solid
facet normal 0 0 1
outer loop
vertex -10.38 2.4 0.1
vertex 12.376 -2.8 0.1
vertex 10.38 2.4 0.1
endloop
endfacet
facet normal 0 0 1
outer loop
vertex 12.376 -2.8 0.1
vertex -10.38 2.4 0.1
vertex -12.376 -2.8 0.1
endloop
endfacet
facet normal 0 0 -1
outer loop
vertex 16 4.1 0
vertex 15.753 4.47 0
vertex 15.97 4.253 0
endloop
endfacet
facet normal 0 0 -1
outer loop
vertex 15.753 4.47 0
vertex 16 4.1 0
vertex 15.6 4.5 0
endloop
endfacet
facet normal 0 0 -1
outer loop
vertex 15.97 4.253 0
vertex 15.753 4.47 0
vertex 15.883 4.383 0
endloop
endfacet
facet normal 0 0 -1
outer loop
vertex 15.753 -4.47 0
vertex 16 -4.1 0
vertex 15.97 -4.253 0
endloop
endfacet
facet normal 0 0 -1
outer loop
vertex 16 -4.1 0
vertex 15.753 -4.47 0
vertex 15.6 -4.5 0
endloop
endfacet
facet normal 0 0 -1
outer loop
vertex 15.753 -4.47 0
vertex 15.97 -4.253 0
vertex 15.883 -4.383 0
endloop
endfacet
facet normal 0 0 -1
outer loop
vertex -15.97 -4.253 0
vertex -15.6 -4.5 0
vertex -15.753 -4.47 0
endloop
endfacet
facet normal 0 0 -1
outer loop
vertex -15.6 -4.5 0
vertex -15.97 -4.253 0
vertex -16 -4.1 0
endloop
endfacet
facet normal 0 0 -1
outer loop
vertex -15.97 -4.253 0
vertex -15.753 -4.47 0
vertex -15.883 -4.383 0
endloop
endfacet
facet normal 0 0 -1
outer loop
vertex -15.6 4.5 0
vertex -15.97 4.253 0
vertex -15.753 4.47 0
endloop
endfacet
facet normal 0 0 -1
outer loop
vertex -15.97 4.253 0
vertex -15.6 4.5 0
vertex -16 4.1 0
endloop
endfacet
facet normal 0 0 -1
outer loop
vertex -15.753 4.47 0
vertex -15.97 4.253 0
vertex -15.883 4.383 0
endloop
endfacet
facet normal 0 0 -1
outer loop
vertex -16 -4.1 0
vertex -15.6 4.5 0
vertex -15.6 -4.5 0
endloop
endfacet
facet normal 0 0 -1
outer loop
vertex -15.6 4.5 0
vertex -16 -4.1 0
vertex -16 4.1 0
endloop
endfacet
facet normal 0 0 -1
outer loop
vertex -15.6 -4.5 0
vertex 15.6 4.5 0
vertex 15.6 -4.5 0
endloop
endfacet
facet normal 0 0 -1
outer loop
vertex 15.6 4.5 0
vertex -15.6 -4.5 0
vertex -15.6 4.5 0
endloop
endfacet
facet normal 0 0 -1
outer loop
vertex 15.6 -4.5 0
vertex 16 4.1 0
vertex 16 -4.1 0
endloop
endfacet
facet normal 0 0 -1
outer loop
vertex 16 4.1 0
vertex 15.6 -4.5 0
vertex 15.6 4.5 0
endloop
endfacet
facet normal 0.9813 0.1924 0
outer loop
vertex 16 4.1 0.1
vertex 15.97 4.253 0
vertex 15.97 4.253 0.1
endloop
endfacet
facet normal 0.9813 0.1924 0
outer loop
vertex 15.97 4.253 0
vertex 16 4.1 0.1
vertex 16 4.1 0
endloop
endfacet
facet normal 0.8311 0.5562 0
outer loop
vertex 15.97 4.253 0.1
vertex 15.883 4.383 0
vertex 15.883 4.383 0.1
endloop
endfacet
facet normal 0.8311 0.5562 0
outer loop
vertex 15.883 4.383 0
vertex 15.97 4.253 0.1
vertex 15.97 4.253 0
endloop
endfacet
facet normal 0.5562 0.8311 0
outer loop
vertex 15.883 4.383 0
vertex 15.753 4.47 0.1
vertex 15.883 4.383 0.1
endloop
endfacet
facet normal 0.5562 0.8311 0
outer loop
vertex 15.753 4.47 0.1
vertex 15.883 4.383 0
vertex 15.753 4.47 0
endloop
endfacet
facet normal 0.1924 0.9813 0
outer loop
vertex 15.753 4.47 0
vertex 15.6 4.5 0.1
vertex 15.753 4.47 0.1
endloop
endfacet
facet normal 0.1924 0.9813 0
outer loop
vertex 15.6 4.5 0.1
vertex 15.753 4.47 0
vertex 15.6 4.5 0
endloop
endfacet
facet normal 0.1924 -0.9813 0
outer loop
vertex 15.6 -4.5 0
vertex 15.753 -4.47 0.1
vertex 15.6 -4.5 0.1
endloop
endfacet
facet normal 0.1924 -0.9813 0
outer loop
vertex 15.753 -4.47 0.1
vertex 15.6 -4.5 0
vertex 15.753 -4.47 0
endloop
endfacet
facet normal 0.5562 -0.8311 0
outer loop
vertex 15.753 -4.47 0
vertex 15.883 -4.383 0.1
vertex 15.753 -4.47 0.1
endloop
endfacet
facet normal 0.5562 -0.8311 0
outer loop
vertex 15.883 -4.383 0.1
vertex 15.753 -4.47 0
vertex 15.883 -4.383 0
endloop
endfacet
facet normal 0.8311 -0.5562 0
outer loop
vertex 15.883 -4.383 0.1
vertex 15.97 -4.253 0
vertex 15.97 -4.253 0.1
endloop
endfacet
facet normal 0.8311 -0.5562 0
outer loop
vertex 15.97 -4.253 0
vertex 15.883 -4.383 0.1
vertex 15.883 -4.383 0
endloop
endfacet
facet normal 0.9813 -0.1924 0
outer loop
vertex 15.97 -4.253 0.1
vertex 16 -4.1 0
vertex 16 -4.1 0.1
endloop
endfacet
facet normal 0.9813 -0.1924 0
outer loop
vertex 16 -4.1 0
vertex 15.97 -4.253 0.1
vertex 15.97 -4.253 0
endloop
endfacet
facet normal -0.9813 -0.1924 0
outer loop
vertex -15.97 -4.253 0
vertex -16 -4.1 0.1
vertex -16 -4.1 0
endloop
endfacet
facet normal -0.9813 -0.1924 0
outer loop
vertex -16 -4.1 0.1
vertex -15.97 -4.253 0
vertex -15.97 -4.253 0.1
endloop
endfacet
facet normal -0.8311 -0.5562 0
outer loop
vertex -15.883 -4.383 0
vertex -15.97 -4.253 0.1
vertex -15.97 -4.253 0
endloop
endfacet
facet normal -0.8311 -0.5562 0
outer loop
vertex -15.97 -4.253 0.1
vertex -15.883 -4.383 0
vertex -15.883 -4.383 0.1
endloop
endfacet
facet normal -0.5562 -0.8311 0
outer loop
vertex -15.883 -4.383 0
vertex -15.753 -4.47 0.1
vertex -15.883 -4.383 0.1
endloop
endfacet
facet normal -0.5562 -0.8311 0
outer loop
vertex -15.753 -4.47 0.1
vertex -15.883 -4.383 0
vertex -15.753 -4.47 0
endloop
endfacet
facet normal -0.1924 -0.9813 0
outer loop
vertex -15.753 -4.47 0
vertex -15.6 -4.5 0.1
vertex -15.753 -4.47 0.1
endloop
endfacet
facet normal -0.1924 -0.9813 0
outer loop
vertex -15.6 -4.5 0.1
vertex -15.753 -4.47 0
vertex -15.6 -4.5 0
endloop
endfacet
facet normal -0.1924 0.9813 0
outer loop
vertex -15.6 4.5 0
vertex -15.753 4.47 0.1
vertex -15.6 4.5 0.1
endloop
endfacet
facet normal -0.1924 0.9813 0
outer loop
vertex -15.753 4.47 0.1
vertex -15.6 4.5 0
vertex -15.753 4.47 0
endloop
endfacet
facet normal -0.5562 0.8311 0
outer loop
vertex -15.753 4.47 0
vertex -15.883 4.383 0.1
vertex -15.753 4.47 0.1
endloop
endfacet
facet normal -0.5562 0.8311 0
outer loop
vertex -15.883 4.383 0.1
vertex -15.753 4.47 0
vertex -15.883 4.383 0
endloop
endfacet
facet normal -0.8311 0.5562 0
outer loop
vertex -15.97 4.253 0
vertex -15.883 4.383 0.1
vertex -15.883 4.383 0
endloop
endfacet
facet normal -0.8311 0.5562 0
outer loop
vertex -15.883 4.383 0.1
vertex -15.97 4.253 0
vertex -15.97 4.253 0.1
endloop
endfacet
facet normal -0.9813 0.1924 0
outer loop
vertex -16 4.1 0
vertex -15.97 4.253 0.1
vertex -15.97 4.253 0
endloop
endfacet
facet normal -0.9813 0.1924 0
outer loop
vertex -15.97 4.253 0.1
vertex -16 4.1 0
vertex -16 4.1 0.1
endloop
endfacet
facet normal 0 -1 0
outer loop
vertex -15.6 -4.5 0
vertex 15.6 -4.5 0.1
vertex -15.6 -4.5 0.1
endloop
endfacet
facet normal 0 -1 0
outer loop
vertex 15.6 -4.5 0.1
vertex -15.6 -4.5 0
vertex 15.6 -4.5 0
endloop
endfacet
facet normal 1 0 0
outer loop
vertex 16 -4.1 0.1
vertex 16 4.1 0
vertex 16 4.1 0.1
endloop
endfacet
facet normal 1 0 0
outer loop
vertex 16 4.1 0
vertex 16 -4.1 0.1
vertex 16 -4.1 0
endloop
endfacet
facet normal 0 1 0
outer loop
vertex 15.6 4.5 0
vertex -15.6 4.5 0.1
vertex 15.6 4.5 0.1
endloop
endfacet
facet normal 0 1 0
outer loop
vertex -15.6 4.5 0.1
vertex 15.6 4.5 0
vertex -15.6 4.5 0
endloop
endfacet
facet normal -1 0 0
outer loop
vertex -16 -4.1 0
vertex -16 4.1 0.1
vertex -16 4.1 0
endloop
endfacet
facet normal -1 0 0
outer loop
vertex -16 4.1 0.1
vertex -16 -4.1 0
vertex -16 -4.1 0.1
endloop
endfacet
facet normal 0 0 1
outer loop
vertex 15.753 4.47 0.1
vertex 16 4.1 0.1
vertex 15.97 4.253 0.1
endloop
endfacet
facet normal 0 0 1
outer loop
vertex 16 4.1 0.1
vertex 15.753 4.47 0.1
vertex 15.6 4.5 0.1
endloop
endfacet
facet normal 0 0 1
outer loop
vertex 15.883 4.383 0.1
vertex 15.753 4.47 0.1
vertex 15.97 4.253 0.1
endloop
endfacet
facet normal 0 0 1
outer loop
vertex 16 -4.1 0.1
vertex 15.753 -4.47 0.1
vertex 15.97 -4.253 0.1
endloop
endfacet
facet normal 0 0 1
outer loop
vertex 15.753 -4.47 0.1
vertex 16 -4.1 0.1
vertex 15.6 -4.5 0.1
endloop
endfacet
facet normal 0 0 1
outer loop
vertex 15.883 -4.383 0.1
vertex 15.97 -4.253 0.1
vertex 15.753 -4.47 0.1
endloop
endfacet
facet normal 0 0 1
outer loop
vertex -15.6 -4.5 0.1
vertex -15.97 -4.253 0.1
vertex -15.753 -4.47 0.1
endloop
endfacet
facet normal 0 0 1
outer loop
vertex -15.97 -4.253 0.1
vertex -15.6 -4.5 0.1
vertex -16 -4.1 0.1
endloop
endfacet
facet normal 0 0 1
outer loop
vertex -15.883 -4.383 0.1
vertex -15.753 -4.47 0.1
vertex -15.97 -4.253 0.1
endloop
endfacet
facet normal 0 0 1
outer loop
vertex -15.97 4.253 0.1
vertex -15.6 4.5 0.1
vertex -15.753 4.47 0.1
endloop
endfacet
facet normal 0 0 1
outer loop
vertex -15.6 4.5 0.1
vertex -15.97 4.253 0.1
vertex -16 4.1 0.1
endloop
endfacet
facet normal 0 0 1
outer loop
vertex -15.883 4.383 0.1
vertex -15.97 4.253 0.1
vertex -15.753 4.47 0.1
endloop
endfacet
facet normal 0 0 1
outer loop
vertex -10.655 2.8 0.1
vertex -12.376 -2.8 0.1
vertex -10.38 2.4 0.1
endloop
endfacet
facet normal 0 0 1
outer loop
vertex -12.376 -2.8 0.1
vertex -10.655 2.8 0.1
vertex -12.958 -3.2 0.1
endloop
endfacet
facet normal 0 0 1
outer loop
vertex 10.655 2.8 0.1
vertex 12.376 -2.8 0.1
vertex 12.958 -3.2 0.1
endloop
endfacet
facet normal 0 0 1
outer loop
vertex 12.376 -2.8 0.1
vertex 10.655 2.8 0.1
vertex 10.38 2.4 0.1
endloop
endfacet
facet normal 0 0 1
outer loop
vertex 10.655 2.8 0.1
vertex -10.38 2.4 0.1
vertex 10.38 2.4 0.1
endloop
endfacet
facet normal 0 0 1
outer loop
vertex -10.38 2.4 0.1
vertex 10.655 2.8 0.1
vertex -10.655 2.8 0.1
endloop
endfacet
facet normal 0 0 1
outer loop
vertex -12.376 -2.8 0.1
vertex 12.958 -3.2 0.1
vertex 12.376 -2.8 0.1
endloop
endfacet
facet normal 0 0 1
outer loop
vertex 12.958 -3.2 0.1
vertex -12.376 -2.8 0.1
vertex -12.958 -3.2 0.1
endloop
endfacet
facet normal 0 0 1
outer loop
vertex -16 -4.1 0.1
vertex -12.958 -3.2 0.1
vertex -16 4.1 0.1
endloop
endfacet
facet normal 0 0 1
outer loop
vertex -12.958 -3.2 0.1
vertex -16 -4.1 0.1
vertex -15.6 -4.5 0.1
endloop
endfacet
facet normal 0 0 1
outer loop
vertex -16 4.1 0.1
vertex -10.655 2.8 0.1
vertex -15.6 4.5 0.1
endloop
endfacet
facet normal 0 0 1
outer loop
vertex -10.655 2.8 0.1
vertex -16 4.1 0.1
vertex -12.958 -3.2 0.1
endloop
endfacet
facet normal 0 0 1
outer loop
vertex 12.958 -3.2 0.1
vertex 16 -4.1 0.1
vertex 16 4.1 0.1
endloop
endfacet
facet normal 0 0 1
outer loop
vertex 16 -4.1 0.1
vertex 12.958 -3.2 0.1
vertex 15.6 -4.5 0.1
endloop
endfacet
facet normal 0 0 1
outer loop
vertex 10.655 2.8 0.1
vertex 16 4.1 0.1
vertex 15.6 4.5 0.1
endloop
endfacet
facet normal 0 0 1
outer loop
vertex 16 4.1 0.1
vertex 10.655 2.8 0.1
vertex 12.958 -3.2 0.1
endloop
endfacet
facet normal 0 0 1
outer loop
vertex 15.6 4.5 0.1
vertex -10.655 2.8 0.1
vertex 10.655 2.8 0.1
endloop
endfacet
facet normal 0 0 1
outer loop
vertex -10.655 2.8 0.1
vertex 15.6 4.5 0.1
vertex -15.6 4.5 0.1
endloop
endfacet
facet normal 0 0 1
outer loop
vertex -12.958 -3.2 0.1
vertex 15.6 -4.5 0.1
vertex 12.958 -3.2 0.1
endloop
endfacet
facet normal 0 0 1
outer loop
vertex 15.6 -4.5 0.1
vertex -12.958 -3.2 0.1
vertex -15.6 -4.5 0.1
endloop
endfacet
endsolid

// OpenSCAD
// file: ../p/1-4cyli.scad
use <../lib.scad>
function ldraw_lib__1_4cyli() = [
// 0 Cylinder 0.25
// 0 Name: 1-4cyli.dat
// 0 Author: James Jessiman
// 0 !LDRAW_ORG Primitive UPDATE 2012-01
// 0 !LICENSE Licensed under CC BY 2.0 and CC BY 4.0 : see CAreadme.txt
// 
// 0 BFC CERTIFY CCW
  [0,"BFC","CERTIFY"],
  [0,"BFC","CCW"],
// 
// 0 !HISTORY 2002-03-23 [sbliss] Added BFC statement.
// 0 !HISTORY 2002-04-25 [PTadmin] Official Update 2002-02
// 0 !HISTORY 2007-06-22 [PTadmin] Header formatted for Contributor Agreement
// 0 !HISTORY 2008-07-01 [PTadmin] Official Update 2008-01
// 0 !HISTORY 2012-02-16 [Philo] Changed to CCW
// 0 !HISTORY 2012-03-30 [PTadmin] Official Update 2012-01
// 
// 
// 4 16 1 1 0 0.9239 1 0.3827 0.9239 0 0.3827 1 0 0
  [4,16,1,1,0,0.9239,1,0.3827,0.9239,0,0.3827,1,0,0],
// 5 24 1 0 0 1 1 0 0.9239 0 0.3827 1 0 -1
  [5,24,1,0,0,1,1,0,0.9239,0,0.3827,1,0,-1],
// 4 16 0.9239 1 0.3827 0.7071 1 0.7071 0.7071 0 0.7071 0.9239 0 0.3827
  [4,16,0.9239,1,0.3827,0.7071,1,0.7071,0.7071,0,0.7071,0.9239,0,0.3827],
// 5 24 0.9239 0 0.3827 0.9239 1 0.3827 0.7071 0 0.7071 1 0 0
  [5,24,0.9239,0,0.3827,0.9239,1,0.3827,0.7071,0,0.7071,1,0,0],
// 4 16 0.7071 1 0.7071 0.3827 1 0.9239 0.3827 0 0.9239 0.7071 0 0.7071
  [4,16,0.7071,1,0.7071,0.3827,1,0.9239,0.3827,0,0.9239,0.7071,0,0.7071],
// 5 24 0.7071 0 0.7071 0.7071 1 0.7071 0.3827 0 0.9239 0.9239 0 0.3827
  [5,24,0.7071,0,0.7071,0.7071,1,0.7071,0.3827,0,0.9239,0.9239,0,0.3827],
// 4 16 0.3827 1 0.9239 0 1 1 0 0 1 0.3827 0 0.9239
  [4,16,0.3827,1,0.9239,0,1,1,0,0,1,0.3827,0,0.9239],
// 5 24 0.3827 0 0.9239 0.3827 1 0.9239 0 0 1 0.7071 0 0.7071
  [5,24,0.3827,0,0.9239,0.3827,1,0.9239,0,0,1,0.7071,0,0.7071],
// 5 24 0 0 1 0 1 1 0.3827 0 0.9239 -1 0 1
  [5,24,0,0,1,0,1,1,0.3827,0,0.9239,-1,0,1],
];
makepoly(ldraw_lib__1_4cyli(), line=0.2);
// file: ../p/1-4chrd.scad
use <../lib.scad>
function ldraw_lib__1_4chrd() = [
// 0 Chord 0.25
// 0 Name: 1-4chrd.dat
// 0 Author: Tony Hafner [hafhead]
// 0 !LDRAW_ORG Primitive UPDATE 2012-02
// 0 !LICENSE Licensed under CC BY 2.0 and CC BY 4.0 : see CAreadme.txt
// 
// 0 BFC CERTIFY CCW
  [0,"BFC","CERTIFY"],
  [0,"BFC","CCW"],
// 
// 0 !HISTORY 2004-04-22 [PTadmin] Official Update 2004-02
// 0 !HISTORY 2007-10-09 [PTadmin] Header formatted for Contributor Agreement
// 0 !HISTORY 2008-07-01 [PTadmin] Official Update 2008-01
// 0 !HISTORY 2012-08-02 [MMR1988] Re-creation with PrimGen2 and Rectifier
// 0 !HISTORY 2012-08-09 [PTadmin] Official Update 2012-02
// 
// 
// 4 16 0.9239 0 0.3827 0.3827 0 0.9239 0 0 1 1 0 0
  [4,16,0.9239,0,0.3827,0.3827,0,0.9239,0,0,1,1,0,0],
// 3 16 0.7071 0 0.7071 0.3827 0 0.9239 0.9239 0 0.3827
  [3,16,0.7071,0,0.7071,0.3827,0,0.9239,0.9239,0,0.3827],
];
makepoly(ldraw_lib__1_4chrd(), line=0.2);
// main file
use <../lib.scad>
use <../p/1-4chrd.scad>
use <../p/1-4cyli.scad>
function ldraw_lib__6045898d() = [
// 0 Sticker  1.1 x  4.0 with SW X-wing Starfighter Cockpit - Rear
// 0 Name: 6045898d.dat
// 0 Author: Evert-Jan Boer [ejboer]
// 0 !LDRAW_ORG Part UPDATE 2022-05
// 0 !LICENSE Licensed under CC BY 2.0 and CC BY 4.0 : see CAreadme.txt
// 
// 0 BFC CERTIFY CCW
  [0,"BFC","CERTIFY"],
  [0,"BFC","CCW"],
// 
// 0 !KEYWORDS Set 10240, Star Wars
// 
// 0 !HISTORY 2022-09-15 [PTadmin] Official Update 2022-05
// 
// 
// 4 16 -30.9402 -.25 -7 30.9402 -.25 -7 25.95 -.25 6 -25.95 -.25 6
  [4,16,-30.9402,-.25,-7,30.9402,-.25,-7,25.95,-.25,6,-25.95,-.25,6],
// 
// 1 16 39 0 10.25 1 0 0 0 -1 0 0 0 1 1-4chrd.dat
  [1,16,39,0,10.25,1,0,0,0,-1,0,0,0,1, ldraw_lib__1_4chrd()],
// 1 16 39 0 -10.25 0 0 1 0 -1 0 -1 0 0 1-4chrd.dat
  [1,16,39,0,-10.25,0,0,1,0,-1,0,-1,0,0, ldraw_lib__1_4chrd()],
// 1 16 -39 0 -10.25 -1 0 0 0 -1 0 0 0 -1 1-4chrd.dat
  [1,16,-39,0,-10.25,-1,0,0,0,-1,0,0,0,-1, ldraw_lib__1_4chrd()],
// 1 16 -39 0 10.25 0 0 -1 0 -1 0 1 0 0 1-4chrd.dat
  [1,16,-39,0,10.25,0,0,-1,0,-1,0,1,0,0, ldraw_lib__1_4chrd()],
// 4 16 -40 0 10.25 -39 0 11.25 -39 0 -11.25 -40 0 -10.25
  [4,16,-40,0,10.25,-39,0,11.25,-39,0,-11.25,-40,0,-10.25],
// 4 16 -39 0 11.25 39 0 11.25 39 0 -11.25 -39 0 -11.25
  [4,16,-39,0,11.25,39,0,11.25,39,0,-11.25,-39,0,-11.25],
// 4 16 39 0 -11.25 39 0 11.25 40 0 10.25 40 0 -10.25
  [4,16,39,0,-11.25,39,0,11.25,40,0,10.25,40,0,-10.25],
// 
// 1 16 39 -.25 10.25 1 0 0 0 .25 0 0 0 1 1-4cyli.dat
  [1,16,39,-.25,10.25,1,0,0,0,.25,0,0,0,1, ldraw_lib__1_4cyli()],
// 1 16 39 -.25 -10.25 0 0 1 0 .25 0 -1 0 0 1-4cyli.dat
  [1,16,39,-.25,-10.25,0,0,1,0,.25,0,-1,0,0, ldraw_lib__1_4cyli()],
// 1 16 -39 -.25 -10.25 -1 0 0 0 .25 0 0 0 -1 1-4cyli.dat
  [1,16,-39,-.25,-10.25,-1,0,0,0,.25,0,0,0,-1, ldraw_lib__1_4cyli()],
// 1 16 -39 -.25 10.25 0 0 -1 0 .25 0 1 0 0 1-4cyli.dat
  [1,16,-39,-.25,10.25,0,0,-1,0,.25,0,1,0,0, ldraw_lib__1_4cyli()],
// 4 16 39 -.25 -11.25 -39 -.25 -11.25 -39 0 -11.25 39 0 -11.25
  [4,16,39,-.25,-11.25,-39,-.25,-11.25,-39,0,-11.25,39,0,-11.25],
// 4 16 40 -.25 10.25 40 -.25 -10.25 40 0 -10.25 40 0 10.25
  [4,16,40,-.25,10.25,40,-.25,-10.25,40,0,-10.25,40,0,10.25],
// 4 16 -39 -.25 11.25 39 -.25 11.25 39 0 11.25 -39 0 11.25
  [4,16,-39,-.25,11.25,39,-.25,11.25,39,0,11.25,-39,0,11.25],
// 4 16 -40 -.25 -10.25 -40 -.25 10.25 -40 0 10.25 -40 0 -10.25
  [4,16,-40,-.25,-10.25,-40,-.25,10.25,-40,0,10.25,-40,0,-10.25],
// 
// 0 BFC NOCLIP
  [0,"BFC","NOCLIP"],
// 
// 1 379 39 -.25 10.25 1 0 0 0 1 0 0 0 1 1-4chrd.dat
  [1,379,39,-.25,10.25,1,0,0,0,1,0,0,0,1, ldraw_lib__1_4chrd()],
// 1 379 39 -.25 -10.25 0 0 1 0 1 0 -1 0 0 1-4chrd.dat
  [1,379,39,-.25,-10.25,0,0,1,0,1,0,-1,0,0, ldraw_lib__1_4chrd()],
// 1 379 -39 -.25 -10.25 -1 0 0 0 1 0 0 0 -1 1-4chrd.dat
  [1,379,-39,-.25,-10.25,-1,0,0,0,1,0,0,0,-1, ldraw_lib__1_4chrd()],
// 1 379 -39 -.25 10.25 0 0 -1 0 1 0 1 0 0 1-4chrd.dat
  [1,379,-39,-.25,10.25,0,0,-1,0,1,0,1,0,0, ldraw_lib__1_4chrd()],
// 4 72 -32.3952 -.25 -8 -30.9402 -.25 -7 -25.95 -.25 6 -26.6373 -.25 7
  [4,72,-32.3952,-.25,-8,-30.9402,-.25,-7,-25.95,-.25,6,-26.6373,-.25,7],
// 4 72 32.3952 -.25 -8 26.6373 -.25 7 25.95 -.25 6 30.9402 -.25 -7
  [4,72,32.3952,-.25,-8,26.6373,-.25,7,25.95,-.25,6,30.9402,-.25,-7],
// 4 72 -25.95 -.25 6 25.95 -.25 6 26.6373 -.25 7 -26.6373 -.25 7
  [4,72,-25.95,-.25,6,25.95,-.25,6,26.6373,-.25,7,-26.6373,-.25,7],
// 4 72 -32.3952 -.25 -8 32.3952 -.25 -8 30.9402 -.25 -7 -30.9402 -.25 -7
  [4,72,-32.3952,-.25,-8,32.3952,-.25,-8,30.9402,-.25,-7,-30.9402,-.25,-7],
// 4 379 -40 -.25 10.25 -40 -.25 -10.25 -39 -.25 -11.25 -32.3952 -.25 -8
  [4,379,-40,-.25,10.25,-40,-.25,-10.25,-39,-.25,-11.25,-32.3952,-.25,-8],
// 4 379 -26.6373 -.25 7 -39 -.25 11.25 -40 -.25 10.25 -32.3952 -.25 -8
  [4,379,-26.6373,-.25,7,-39,-.25,11.25,-40,-.25,10.25,-32.3952,-.25,-8],
// 4 379 39 -.25 -11.25 40 -.25 -10.25 40 -.25 10.25 32.3952 -.25 -8
  [4,379,39,-.25,-11.25,40,-.25,-10.25,40,-.25,10.25,32.3952,-.25,-8],
// 4 379 32.3952 -.25 -8 40 -.25 10.25 39 -.25 11.25 26.6373 -.25 7
  [4,379,32.3952,-.25,-8,40,-.25,10.25,39,-.25,11.25,26.6373,-.25,7],
// 4 379 -39 -.25 11.25 -26.6373 -.25 7 26.6373 -.25 7 39 -.25 11.25
  [4,379,-39,-.25,11.25,-26.6373,-.25,7,26.6373,-.25,7,39,-.25,11.25],
// 4 379 39 -.25 -11.25 32.3952 -.25 -8 -32.3952 -.25 -8 -39 -.25 -11.25
  [4,379,39,-.25,-11.25,32.3952,-.25,-8,-32.3952,-.25,-8,-39,-.25,-11.25],
];
makepoly(ldraw_lib__6045898d(), line=0.2);
